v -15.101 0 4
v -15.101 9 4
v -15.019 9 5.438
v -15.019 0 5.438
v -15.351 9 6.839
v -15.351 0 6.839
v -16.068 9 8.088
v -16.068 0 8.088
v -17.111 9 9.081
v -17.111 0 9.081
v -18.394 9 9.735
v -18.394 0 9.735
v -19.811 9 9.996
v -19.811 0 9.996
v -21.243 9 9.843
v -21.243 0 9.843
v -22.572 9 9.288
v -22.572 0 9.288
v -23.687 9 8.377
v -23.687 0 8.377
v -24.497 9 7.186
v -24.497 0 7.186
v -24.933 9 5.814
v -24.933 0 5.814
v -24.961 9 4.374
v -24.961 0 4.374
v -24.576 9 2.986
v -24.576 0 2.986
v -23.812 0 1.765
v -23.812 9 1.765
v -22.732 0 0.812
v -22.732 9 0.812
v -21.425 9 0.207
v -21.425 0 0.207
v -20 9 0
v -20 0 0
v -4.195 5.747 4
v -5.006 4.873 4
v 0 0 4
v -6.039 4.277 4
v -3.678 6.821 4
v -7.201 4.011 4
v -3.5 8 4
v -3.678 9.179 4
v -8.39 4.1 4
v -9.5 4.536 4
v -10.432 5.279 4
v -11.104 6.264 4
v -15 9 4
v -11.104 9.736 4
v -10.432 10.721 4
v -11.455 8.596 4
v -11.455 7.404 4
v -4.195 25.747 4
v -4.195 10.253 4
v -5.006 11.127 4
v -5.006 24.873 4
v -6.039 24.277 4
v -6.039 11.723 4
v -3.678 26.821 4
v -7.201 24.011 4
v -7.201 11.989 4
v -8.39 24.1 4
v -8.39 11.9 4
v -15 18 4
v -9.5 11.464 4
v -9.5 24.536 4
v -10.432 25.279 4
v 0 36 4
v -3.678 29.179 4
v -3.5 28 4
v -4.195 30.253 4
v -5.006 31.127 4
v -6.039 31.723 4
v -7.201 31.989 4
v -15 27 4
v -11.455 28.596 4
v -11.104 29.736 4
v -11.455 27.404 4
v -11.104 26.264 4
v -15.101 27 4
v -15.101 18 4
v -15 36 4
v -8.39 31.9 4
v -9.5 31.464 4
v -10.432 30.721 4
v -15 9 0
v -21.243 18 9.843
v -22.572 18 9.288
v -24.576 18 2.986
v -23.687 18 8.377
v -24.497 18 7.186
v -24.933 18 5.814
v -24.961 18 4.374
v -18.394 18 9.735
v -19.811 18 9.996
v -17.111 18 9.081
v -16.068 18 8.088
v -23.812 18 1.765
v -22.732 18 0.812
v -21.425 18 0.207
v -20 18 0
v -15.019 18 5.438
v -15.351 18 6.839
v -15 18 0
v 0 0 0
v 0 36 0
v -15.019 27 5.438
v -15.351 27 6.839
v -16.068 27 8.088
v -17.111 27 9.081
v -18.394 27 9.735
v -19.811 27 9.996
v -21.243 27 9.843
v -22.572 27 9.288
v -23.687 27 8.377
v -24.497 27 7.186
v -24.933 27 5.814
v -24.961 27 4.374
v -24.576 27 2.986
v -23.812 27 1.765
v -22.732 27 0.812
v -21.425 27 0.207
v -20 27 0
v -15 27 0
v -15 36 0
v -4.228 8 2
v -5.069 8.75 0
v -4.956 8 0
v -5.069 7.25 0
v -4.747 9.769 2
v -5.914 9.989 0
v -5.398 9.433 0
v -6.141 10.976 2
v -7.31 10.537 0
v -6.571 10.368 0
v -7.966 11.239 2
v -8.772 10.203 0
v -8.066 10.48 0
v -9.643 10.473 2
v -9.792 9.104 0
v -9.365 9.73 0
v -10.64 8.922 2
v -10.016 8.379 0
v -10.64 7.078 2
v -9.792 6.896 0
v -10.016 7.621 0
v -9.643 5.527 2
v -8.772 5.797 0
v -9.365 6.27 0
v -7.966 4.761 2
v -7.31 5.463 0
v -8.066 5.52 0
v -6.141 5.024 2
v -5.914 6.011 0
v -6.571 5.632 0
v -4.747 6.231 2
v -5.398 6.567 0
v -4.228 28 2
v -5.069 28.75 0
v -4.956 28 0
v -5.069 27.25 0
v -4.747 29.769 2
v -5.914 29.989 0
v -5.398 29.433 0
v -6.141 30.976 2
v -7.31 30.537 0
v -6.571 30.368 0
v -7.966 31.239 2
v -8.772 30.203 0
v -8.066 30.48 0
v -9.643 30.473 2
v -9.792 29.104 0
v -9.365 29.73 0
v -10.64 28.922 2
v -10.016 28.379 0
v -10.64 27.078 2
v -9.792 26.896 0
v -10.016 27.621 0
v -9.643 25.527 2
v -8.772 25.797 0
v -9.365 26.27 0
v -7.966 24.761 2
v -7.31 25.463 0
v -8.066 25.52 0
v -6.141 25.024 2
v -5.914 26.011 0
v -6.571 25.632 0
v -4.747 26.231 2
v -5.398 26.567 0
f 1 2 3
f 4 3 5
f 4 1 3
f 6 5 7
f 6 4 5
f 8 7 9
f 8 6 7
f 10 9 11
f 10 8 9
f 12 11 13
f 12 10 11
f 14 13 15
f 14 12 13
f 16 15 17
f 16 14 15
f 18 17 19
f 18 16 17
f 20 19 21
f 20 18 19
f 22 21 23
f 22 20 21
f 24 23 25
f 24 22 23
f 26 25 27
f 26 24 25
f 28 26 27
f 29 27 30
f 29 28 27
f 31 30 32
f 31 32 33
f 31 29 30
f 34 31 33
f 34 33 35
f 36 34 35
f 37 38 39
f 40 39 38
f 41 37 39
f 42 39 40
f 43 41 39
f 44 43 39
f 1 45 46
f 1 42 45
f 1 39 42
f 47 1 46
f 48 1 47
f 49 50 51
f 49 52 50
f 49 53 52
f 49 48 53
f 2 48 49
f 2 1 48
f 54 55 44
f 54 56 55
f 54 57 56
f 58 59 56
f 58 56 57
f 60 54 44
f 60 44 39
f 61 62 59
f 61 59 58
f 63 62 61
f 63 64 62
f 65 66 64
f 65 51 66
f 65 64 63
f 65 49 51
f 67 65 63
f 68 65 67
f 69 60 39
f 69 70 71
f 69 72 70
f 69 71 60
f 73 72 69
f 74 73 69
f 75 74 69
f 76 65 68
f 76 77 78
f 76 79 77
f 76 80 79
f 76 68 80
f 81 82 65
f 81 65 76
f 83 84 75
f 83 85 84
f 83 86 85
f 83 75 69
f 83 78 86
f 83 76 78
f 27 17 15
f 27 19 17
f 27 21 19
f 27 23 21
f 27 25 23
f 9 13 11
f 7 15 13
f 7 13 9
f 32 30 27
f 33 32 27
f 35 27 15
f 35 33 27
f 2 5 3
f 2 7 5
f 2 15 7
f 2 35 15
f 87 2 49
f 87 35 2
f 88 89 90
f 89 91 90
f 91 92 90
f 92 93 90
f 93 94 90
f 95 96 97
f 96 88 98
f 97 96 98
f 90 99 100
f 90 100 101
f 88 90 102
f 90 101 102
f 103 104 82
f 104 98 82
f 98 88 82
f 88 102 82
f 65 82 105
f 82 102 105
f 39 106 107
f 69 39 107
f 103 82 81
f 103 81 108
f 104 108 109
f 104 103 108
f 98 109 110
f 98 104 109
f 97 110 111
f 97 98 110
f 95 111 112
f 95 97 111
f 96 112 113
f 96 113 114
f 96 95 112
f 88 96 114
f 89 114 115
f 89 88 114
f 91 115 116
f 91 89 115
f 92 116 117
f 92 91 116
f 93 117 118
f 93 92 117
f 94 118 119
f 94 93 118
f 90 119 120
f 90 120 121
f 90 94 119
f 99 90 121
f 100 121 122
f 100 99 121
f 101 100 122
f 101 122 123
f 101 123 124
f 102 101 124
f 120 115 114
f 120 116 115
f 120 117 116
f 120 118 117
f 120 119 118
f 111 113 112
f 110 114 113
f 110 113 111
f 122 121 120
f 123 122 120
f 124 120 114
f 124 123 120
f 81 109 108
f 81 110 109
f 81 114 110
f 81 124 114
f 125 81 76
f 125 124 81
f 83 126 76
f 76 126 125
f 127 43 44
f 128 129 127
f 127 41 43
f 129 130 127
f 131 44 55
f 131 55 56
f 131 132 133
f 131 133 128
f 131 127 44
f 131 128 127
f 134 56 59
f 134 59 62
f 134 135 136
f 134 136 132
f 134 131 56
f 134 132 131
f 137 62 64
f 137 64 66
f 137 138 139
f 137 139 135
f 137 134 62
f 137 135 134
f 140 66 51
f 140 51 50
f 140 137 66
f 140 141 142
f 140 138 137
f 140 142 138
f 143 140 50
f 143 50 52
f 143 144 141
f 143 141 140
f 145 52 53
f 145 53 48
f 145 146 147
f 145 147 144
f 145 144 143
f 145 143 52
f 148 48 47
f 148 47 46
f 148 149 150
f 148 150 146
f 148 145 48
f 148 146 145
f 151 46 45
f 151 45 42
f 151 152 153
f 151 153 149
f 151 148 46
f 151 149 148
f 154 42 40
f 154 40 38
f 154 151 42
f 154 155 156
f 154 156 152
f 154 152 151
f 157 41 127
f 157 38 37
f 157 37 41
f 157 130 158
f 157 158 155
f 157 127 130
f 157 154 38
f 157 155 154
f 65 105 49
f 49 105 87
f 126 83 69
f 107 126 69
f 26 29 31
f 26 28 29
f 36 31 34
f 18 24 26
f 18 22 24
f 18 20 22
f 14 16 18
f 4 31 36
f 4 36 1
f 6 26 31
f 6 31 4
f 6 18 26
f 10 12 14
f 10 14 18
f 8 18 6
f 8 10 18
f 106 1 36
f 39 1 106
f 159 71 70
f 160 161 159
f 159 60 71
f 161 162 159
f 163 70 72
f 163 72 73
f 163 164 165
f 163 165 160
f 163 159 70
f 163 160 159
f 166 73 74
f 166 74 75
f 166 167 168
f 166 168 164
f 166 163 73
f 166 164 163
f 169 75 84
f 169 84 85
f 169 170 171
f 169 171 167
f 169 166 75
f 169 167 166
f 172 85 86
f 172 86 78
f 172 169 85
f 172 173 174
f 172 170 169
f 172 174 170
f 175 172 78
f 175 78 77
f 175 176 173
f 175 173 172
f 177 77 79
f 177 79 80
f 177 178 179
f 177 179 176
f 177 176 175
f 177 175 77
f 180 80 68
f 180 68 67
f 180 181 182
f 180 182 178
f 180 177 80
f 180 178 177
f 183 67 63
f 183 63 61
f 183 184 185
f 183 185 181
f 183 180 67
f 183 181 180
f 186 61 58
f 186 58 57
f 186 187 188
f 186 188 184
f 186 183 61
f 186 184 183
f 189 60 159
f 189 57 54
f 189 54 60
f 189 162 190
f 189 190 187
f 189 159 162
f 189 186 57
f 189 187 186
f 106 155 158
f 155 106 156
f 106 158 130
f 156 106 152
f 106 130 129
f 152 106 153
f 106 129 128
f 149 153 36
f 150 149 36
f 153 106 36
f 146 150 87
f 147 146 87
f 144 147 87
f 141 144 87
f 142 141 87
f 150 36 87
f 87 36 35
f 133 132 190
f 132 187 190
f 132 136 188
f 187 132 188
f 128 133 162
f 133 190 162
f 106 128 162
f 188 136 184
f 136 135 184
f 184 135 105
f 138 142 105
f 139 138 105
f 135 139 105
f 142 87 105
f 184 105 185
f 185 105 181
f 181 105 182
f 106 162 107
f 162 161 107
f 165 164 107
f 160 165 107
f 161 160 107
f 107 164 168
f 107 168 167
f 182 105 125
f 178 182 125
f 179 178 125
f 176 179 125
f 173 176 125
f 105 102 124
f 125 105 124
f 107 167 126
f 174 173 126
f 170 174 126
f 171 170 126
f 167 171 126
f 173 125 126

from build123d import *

# Parameters (mm, degrees)
SKETCH3_W           = 36
SKETCH3_H           = 20
SKETCH3_R           = 2.5
BOSS_EXTRUDE2_DEPTH = 4
SKETCH4_R           = 5
BOSS_EXTRUDE3_DEPTH = 36
CHAMFER1_SIZE       = 1.5
CHAMFER1_SIZE_2     = 4.121216129
SKETCH5_W           = 10
SKETCH5_H           = 9
CUT_EXTRUDE2_DEPTH  = 45.955533586


with BuildPart() as part:
    # Sketch3 → Boss-Extrude2 (new body)
    with BuildSketch(Plane(origin=(0, 0, 0), x_dir=(0, 1, 0), z_dir=(0, 0, 1))):
        with Locations((18, 10)):
            Rectangle(SKETCH3_W, SKETCH3_H)
        with Locations(Location((8, 7.5, 0), (0, 0, 270))):
            Circle(SKETCH3_R, mode=Mode.SUBTRACT)
        with Locations(Location((28, 7.5, 0), (0, 0, 270))):
            Circle(SKETCH3_R, mode=Mode.SUBTRACT)
    extrude(amount=BOSS_EXTRUDE2_DEPTH)

    # Sketch4 → Boss-Extrude3 (add, through all)
    with BuildSketch(Plane.XZ):
        with Locations((-20, 5)):
            Circle(SKETCH4_R)
    extrude(amount=-BOSS_EXTRUDE3_DEPTH)

    # Chamfer1
    # the kernel refuses this chamfer: 4.121216129, 1.5 mm, written as the material it takes off along each edge
    with BuildSketch(Plane(origin=(-7.5, 28, 4), x_dir=(1, 0, 0), z_dir=(0, -1, 0))) as chamfer1_piece_1:
        Polygon((2.5 + CHAMFER1_SIZE, 0), (2.5, -CHAMFER1_SIZE_2), (2.5, 0), align=None)
    revolve(axis=Axis((-7.5, 28, 4), (0, 0, 1)), mode=Mode.SUBTRACT)
    with BuildSketch(Plane(origin=(-7.5, 8, 4), x_dir=(1, 0, 0), z_dir=(0, -1, 0))) as chamfer1_piece_2:
        Polygon((2.5 + CHAMFER1_SIZE, 0), (2.5, -CHAMFER1_SIZE_2), (2.5, 0), align=None)
    revolve(axis=Axis((-7.5, 8, 4), (0, 0, 1)), mode=Mode.SUBTRACT)

    # Sketch5 → Cut-Extrude2 (cut, through all)
    with BuildSketch(Plane(origin=(0, 0, 0), x_dir=(1, 0, 0), z_dir=(0, 0, -1))):
        with Locations((-20, -13.5)):
            Rectangle(SKETCH5_W, SKETCH5_H)
        with Locations((-20, -31.5)):
            Rectangle(SKETCH5_W, SKETCH5_H)
    extrude(amount=-CUT_EXTRUDE2_DEPTH, mode=Mode.SUBTRACT)


solid = part.part
